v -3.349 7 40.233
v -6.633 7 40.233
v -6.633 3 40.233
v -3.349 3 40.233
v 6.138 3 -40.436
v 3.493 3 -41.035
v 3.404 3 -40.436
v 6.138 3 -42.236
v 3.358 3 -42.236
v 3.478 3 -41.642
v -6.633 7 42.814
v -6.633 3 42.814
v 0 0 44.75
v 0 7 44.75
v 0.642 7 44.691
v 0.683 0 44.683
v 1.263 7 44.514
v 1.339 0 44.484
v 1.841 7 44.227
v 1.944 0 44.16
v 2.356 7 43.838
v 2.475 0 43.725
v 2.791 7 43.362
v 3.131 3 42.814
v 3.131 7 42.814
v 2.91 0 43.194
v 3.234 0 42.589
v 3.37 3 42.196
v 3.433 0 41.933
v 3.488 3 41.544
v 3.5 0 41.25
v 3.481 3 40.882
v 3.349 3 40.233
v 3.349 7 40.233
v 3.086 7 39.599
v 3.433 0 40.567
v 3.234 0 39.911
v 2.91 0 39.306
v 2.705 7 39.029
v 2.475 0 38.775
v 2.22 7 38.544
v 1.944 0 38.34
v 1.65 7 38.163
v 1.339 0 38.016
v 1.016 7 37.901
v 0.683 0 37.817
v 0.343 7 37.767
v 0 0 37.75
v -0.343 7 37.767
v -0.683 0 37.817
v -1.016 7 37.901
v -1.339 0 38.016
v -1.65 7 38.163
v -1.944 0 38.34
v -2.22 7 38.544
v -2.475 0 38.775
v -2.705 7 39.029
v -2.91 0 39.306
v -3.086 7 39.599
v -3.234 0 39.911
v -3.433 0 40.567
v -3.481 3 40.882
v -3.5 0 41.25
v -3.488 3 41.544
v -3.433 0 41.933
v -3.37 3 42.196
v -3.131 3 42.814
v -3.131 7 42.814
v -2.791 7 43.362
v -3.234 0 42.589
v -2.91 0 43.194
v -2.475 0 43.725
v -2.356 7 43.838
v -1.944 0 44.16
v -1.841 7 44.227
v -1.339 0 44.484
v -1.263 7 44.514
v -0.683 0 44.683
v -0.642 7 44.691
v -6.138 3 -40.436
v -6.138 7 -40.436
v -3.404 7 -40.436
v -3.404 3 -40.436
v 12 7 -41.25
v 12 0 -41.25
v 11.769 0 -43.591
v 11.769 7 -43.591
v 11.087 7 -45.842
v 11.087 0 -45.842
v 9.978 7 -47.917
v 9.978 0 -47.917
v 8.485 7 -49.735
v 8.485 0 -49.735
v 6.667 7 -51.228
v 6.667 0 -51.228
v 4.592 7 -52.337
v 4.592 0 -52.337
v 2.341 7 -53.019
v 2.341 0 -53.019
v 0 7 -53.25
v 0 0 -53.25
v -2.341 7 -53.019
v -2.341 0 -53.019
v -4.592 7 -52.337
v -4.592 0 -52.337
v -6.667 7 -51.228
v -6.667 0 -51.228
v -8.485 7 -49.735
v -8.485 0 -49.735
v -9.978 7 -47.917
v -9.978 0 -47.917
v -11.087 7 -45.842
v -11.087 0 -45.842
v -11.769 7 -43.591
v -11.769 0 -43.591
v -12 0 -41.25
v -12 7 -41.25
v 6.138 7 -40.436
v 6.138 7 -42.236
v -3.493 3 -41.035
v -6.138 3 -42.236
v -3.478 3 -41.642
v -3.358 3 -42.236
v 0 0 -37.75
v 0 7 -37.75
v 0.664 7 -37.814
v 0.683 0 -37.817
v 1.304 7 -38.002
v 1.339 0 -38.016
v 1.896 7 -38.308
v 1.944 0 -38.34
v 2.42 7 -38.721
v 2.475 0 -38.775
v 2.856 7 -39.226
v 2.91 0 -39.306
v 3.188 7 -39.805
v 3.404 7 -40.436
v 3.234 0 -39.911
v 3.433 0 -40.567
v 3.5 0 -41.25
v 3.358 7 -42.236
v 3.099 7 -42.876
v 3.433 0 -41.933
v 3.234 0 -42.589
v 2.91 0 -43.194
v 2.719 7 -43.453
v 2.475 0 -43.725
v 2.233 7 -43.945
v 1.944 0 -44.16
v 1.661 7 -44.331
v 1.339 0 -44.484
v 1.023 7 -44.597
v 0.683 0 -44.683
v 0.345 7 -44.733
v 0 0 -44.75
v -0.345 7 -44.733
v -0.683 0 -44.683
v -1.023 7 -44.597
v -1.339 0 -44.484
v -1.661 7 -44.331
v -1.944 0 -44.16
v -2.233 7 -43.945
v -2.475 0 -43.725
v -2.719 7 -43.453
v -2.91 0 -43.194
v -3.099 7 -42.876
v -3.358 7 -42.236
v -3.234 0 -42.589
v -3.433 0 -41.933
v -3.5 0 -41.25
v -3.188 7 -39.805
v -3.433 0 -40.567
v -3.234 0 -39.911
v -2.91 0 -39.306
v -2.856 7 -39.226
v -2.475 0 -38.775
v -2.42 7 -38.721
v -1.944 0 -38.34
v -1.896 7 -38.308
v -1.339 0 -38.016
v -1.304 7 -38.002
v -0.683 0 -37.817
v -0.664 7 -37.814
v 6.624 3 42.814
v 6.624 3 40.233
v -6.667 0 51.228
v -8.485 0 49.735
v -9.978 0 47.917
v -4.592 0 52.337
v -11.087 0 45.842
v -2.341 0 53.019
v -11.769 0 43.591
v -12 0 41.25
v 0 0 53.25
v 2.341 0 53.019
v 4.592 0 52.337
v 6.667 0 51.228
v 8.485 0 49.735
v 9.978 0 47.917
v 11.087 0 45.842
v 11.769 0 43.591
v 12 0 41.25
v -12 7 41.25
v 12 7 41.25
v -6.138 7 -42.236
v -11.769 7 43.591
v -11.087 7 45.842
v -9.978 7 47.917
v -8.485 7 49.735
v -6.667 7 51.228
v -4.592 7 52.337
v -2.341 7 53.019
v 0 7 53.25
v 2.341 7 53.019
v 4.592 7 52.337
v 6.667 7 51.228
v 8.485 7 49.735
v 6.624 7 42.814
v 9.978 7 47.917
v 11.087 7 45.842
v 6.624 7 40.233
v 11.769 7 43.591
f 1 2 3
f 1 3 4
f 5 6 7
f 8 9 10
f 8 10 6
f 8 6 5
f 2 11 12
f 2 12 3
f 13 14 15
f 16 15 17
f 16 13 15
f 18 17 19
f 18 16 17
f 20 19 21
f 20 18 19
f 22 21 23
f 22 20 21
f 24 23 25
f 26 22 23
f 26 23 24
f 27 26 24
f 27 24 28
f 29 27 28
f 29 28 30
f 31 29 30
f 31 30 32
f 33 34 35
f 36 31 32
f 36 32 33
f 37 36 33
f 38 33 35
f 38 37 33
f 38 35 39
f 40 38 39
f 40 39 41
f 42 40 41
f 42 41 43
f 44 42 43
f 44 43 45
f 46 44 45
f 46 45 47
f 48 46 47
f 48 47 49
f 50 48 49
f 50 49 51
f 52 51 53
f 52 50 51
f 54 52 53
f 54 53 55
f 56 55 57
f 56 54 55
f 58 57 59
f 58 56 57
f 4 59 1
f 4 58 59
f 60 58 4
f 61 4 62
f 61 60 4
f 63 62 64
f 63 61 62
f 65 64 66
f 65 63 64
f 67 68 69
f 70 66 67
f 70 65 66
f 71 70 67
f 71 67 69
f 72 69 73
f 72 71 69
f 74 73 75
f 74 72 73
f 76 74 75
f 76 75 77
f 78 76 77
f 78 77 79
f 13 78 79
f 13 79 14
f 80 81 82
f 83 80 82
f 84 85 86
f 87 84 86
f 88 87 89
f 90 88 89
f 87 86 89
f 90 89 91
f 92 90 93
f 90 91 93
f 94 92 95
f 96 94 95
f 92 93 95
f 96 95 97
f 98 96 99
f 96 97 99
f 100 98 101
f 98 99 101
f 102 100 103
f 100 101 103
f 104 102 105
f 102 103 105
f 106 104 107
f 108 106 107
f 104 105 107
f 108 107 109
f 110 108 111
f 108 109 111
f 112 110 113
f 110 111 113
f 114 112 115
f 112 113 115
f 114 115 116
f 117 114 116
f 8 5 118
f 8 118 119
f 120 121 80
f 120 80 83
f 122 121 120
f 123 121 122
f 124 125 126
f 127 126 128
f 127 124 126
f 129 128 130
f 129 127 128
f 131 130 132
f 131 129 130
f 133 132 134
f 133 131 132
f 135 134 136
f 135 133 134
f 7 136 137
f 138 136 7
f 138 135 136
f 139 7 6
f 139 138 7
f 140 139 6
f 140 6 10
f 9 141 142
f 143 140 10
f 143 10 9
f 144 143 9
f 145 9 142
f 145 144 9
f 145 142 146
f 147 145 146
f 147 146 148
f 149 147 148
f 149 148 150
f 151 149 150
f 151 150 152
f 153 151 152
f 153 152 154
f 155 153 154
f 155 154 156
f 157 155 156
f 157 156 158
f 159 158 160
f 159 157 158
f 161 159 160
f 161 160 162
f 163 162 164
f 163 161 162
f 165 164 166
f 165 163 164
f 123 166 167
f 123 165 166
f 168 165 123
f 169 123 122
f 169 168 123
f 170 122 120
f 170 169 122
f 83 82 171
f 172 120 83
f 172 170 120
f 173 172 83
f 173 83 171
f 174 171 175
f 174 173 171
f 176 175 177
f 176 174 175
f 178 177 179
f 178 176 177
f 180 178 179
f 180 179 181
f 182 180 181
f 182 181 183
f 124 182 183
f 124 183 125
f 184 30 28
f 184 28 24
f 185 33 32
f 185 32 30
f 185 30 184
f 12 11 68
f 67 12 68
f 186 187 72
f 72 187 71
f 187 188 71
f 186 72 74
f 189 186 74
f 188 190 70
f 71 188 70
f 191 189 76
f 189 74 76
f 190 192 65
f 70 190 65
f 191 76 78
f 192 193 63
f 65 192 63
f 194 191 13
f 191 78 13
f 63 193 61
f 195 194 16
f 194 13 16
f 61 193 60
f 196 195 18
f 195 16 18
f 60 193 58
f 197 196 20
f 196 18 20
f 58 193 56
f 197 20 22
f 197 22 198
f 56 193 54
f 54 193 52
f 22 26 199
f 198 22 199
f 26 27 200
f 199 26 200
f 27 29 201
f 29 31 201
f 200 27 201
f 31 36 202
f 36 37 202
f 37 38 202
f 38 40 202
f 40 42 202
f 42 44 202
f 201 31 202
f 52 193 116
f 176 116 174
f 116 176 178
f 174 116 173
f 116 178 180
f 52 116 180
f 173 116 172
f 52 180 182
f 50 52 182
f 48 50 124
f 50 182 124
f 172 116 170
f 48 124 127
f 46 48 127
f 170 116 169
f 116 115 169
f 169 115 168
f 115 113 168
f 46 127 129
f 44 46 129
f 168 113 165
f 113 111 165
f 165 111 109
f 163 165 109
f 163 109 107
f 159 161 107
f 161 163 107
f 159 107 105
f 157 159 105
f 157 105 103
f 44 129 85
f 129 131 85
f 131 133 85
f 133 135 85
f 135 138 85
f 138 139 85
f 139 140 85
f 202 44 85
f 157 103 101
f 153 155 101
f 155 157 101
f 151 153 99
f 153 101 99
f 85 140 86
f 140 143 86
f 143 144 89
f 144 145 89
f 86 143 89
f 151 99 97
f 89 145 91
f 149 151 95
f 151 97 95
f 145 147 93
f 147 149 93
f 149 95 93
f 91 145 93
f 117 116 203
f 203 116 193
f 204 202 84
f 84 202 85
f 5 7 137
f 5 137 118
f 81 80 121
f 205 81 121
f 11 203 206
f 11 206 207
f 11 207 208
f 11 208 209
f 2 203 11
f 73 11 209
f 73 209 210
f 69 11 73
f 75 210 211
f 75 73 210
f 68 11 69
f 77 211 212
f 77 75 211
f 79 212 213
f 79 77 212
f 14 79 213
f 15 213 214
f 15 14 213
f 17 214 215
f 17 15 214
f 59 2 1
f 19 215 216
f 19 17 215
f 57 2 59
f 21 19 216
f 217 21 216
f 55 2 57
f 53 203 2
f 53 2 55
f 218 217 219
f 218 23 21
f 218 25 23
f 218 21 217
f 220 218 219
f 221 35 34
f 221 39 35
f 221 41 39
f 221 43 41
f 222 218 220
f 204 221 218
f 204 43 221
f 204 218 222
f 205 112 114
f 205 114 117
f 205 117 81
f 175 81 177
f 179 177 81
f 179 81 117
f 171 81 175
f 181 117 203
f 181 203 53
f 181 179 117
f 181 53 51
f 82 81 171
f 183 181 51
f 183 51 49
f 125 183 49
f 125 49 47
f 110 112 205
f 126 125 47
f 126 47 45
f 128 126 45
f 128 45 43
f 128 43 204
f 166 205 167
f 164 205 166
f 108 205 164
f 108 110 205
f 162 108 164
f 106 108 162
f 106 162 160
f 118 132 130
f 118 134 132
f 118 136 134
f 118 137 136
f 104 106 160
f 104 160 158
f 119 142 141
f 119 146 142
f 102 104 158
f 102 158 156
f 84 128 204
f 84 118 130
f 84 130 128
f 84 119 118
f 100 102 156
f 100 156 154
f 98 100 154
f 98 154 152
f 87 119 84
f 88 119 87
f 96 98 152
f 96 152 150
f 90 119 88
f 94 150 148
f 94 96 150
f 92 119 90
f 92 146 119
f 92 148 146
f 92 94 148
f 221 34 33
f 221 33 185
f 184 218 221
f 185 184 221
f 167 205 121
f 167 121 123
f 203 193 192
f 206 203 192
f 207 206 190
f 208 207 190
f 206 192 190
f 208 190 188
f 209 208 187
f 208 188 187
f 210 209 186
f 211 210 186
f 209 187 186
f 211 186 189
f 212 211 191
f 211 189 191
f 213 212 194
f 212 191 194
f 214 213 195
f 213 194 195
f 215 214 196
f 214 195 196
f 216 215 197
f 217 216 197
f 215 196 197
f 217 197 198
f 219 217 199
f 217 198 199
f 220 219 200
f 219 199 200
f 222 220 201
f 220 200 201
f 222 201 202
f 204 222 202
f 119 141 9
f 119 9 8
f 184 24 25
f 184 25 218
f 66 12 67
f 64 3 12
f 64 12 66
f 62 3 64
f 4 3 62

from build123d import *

# Parameters (mm, degrees)
SKETCH1_R           = 3.5
BOSS_EXTRUDE1_DEPTH = 7
SKETCH2_W           = 13.256743243
SKETCH2_H           = 2.580958861
SKETCH2_W_2         = 12.276635078
SKETCH2_H_2         = 1.8
CUT_EXTRUDE1_DEPTH  = 4


with BuildPart() as part:
    # Sketch1 → Boss-Extrude1 (new body)
    with BuildSketch(Plane(origin=(0, 0, 0), x_dir=(1, 0, 0), z_dir=(0, 1, 0))):
        with BuildLine():
            Line((-12, 41.25), (-12, -41.25))
            ThreePointArc((-12, -41.25), (0, -53.25), (12, -41.25))
            Line((12, -41.25), (12, 41.25))
            ThreePointArc((12, 41.25), (0, 53.25), (-12, 41.25))
        make_face()
        with Locations(Location((0, 41.25, 0), (0, 0, 270))):
            Circle(SKETCH1_R, mode=Mode.SUBTRACT)
        with Locations(Location((0, -41.25, 0), (0, 0, 270))):
            Circle(SKETCH1_R, mode=Mode.SUBTRACT)
    extrude(amount=BOSS_EXTRUDE1_DEPTH)

    # Sketch2 → Cut-Extrude1 (cut)
    with BuildSketch(Plane(origin=(0, 7, 0), x_dir=(1, 0, 0), z_dir=(0, 1, 0))):
        with Locations((-0.004439632, -41.523432512)):
            Rectangle(SKETCH2_W, SKETCH2_H)
        with Locations((0, 41.335850456)):
            Rectangle(SKETCH2_W_2, SKETCH2_H_2)
    extrude(amount=-CUT_EXTRUDE1_DEPTH, mode=Mode.SUBTRACT)


solid = part.part
